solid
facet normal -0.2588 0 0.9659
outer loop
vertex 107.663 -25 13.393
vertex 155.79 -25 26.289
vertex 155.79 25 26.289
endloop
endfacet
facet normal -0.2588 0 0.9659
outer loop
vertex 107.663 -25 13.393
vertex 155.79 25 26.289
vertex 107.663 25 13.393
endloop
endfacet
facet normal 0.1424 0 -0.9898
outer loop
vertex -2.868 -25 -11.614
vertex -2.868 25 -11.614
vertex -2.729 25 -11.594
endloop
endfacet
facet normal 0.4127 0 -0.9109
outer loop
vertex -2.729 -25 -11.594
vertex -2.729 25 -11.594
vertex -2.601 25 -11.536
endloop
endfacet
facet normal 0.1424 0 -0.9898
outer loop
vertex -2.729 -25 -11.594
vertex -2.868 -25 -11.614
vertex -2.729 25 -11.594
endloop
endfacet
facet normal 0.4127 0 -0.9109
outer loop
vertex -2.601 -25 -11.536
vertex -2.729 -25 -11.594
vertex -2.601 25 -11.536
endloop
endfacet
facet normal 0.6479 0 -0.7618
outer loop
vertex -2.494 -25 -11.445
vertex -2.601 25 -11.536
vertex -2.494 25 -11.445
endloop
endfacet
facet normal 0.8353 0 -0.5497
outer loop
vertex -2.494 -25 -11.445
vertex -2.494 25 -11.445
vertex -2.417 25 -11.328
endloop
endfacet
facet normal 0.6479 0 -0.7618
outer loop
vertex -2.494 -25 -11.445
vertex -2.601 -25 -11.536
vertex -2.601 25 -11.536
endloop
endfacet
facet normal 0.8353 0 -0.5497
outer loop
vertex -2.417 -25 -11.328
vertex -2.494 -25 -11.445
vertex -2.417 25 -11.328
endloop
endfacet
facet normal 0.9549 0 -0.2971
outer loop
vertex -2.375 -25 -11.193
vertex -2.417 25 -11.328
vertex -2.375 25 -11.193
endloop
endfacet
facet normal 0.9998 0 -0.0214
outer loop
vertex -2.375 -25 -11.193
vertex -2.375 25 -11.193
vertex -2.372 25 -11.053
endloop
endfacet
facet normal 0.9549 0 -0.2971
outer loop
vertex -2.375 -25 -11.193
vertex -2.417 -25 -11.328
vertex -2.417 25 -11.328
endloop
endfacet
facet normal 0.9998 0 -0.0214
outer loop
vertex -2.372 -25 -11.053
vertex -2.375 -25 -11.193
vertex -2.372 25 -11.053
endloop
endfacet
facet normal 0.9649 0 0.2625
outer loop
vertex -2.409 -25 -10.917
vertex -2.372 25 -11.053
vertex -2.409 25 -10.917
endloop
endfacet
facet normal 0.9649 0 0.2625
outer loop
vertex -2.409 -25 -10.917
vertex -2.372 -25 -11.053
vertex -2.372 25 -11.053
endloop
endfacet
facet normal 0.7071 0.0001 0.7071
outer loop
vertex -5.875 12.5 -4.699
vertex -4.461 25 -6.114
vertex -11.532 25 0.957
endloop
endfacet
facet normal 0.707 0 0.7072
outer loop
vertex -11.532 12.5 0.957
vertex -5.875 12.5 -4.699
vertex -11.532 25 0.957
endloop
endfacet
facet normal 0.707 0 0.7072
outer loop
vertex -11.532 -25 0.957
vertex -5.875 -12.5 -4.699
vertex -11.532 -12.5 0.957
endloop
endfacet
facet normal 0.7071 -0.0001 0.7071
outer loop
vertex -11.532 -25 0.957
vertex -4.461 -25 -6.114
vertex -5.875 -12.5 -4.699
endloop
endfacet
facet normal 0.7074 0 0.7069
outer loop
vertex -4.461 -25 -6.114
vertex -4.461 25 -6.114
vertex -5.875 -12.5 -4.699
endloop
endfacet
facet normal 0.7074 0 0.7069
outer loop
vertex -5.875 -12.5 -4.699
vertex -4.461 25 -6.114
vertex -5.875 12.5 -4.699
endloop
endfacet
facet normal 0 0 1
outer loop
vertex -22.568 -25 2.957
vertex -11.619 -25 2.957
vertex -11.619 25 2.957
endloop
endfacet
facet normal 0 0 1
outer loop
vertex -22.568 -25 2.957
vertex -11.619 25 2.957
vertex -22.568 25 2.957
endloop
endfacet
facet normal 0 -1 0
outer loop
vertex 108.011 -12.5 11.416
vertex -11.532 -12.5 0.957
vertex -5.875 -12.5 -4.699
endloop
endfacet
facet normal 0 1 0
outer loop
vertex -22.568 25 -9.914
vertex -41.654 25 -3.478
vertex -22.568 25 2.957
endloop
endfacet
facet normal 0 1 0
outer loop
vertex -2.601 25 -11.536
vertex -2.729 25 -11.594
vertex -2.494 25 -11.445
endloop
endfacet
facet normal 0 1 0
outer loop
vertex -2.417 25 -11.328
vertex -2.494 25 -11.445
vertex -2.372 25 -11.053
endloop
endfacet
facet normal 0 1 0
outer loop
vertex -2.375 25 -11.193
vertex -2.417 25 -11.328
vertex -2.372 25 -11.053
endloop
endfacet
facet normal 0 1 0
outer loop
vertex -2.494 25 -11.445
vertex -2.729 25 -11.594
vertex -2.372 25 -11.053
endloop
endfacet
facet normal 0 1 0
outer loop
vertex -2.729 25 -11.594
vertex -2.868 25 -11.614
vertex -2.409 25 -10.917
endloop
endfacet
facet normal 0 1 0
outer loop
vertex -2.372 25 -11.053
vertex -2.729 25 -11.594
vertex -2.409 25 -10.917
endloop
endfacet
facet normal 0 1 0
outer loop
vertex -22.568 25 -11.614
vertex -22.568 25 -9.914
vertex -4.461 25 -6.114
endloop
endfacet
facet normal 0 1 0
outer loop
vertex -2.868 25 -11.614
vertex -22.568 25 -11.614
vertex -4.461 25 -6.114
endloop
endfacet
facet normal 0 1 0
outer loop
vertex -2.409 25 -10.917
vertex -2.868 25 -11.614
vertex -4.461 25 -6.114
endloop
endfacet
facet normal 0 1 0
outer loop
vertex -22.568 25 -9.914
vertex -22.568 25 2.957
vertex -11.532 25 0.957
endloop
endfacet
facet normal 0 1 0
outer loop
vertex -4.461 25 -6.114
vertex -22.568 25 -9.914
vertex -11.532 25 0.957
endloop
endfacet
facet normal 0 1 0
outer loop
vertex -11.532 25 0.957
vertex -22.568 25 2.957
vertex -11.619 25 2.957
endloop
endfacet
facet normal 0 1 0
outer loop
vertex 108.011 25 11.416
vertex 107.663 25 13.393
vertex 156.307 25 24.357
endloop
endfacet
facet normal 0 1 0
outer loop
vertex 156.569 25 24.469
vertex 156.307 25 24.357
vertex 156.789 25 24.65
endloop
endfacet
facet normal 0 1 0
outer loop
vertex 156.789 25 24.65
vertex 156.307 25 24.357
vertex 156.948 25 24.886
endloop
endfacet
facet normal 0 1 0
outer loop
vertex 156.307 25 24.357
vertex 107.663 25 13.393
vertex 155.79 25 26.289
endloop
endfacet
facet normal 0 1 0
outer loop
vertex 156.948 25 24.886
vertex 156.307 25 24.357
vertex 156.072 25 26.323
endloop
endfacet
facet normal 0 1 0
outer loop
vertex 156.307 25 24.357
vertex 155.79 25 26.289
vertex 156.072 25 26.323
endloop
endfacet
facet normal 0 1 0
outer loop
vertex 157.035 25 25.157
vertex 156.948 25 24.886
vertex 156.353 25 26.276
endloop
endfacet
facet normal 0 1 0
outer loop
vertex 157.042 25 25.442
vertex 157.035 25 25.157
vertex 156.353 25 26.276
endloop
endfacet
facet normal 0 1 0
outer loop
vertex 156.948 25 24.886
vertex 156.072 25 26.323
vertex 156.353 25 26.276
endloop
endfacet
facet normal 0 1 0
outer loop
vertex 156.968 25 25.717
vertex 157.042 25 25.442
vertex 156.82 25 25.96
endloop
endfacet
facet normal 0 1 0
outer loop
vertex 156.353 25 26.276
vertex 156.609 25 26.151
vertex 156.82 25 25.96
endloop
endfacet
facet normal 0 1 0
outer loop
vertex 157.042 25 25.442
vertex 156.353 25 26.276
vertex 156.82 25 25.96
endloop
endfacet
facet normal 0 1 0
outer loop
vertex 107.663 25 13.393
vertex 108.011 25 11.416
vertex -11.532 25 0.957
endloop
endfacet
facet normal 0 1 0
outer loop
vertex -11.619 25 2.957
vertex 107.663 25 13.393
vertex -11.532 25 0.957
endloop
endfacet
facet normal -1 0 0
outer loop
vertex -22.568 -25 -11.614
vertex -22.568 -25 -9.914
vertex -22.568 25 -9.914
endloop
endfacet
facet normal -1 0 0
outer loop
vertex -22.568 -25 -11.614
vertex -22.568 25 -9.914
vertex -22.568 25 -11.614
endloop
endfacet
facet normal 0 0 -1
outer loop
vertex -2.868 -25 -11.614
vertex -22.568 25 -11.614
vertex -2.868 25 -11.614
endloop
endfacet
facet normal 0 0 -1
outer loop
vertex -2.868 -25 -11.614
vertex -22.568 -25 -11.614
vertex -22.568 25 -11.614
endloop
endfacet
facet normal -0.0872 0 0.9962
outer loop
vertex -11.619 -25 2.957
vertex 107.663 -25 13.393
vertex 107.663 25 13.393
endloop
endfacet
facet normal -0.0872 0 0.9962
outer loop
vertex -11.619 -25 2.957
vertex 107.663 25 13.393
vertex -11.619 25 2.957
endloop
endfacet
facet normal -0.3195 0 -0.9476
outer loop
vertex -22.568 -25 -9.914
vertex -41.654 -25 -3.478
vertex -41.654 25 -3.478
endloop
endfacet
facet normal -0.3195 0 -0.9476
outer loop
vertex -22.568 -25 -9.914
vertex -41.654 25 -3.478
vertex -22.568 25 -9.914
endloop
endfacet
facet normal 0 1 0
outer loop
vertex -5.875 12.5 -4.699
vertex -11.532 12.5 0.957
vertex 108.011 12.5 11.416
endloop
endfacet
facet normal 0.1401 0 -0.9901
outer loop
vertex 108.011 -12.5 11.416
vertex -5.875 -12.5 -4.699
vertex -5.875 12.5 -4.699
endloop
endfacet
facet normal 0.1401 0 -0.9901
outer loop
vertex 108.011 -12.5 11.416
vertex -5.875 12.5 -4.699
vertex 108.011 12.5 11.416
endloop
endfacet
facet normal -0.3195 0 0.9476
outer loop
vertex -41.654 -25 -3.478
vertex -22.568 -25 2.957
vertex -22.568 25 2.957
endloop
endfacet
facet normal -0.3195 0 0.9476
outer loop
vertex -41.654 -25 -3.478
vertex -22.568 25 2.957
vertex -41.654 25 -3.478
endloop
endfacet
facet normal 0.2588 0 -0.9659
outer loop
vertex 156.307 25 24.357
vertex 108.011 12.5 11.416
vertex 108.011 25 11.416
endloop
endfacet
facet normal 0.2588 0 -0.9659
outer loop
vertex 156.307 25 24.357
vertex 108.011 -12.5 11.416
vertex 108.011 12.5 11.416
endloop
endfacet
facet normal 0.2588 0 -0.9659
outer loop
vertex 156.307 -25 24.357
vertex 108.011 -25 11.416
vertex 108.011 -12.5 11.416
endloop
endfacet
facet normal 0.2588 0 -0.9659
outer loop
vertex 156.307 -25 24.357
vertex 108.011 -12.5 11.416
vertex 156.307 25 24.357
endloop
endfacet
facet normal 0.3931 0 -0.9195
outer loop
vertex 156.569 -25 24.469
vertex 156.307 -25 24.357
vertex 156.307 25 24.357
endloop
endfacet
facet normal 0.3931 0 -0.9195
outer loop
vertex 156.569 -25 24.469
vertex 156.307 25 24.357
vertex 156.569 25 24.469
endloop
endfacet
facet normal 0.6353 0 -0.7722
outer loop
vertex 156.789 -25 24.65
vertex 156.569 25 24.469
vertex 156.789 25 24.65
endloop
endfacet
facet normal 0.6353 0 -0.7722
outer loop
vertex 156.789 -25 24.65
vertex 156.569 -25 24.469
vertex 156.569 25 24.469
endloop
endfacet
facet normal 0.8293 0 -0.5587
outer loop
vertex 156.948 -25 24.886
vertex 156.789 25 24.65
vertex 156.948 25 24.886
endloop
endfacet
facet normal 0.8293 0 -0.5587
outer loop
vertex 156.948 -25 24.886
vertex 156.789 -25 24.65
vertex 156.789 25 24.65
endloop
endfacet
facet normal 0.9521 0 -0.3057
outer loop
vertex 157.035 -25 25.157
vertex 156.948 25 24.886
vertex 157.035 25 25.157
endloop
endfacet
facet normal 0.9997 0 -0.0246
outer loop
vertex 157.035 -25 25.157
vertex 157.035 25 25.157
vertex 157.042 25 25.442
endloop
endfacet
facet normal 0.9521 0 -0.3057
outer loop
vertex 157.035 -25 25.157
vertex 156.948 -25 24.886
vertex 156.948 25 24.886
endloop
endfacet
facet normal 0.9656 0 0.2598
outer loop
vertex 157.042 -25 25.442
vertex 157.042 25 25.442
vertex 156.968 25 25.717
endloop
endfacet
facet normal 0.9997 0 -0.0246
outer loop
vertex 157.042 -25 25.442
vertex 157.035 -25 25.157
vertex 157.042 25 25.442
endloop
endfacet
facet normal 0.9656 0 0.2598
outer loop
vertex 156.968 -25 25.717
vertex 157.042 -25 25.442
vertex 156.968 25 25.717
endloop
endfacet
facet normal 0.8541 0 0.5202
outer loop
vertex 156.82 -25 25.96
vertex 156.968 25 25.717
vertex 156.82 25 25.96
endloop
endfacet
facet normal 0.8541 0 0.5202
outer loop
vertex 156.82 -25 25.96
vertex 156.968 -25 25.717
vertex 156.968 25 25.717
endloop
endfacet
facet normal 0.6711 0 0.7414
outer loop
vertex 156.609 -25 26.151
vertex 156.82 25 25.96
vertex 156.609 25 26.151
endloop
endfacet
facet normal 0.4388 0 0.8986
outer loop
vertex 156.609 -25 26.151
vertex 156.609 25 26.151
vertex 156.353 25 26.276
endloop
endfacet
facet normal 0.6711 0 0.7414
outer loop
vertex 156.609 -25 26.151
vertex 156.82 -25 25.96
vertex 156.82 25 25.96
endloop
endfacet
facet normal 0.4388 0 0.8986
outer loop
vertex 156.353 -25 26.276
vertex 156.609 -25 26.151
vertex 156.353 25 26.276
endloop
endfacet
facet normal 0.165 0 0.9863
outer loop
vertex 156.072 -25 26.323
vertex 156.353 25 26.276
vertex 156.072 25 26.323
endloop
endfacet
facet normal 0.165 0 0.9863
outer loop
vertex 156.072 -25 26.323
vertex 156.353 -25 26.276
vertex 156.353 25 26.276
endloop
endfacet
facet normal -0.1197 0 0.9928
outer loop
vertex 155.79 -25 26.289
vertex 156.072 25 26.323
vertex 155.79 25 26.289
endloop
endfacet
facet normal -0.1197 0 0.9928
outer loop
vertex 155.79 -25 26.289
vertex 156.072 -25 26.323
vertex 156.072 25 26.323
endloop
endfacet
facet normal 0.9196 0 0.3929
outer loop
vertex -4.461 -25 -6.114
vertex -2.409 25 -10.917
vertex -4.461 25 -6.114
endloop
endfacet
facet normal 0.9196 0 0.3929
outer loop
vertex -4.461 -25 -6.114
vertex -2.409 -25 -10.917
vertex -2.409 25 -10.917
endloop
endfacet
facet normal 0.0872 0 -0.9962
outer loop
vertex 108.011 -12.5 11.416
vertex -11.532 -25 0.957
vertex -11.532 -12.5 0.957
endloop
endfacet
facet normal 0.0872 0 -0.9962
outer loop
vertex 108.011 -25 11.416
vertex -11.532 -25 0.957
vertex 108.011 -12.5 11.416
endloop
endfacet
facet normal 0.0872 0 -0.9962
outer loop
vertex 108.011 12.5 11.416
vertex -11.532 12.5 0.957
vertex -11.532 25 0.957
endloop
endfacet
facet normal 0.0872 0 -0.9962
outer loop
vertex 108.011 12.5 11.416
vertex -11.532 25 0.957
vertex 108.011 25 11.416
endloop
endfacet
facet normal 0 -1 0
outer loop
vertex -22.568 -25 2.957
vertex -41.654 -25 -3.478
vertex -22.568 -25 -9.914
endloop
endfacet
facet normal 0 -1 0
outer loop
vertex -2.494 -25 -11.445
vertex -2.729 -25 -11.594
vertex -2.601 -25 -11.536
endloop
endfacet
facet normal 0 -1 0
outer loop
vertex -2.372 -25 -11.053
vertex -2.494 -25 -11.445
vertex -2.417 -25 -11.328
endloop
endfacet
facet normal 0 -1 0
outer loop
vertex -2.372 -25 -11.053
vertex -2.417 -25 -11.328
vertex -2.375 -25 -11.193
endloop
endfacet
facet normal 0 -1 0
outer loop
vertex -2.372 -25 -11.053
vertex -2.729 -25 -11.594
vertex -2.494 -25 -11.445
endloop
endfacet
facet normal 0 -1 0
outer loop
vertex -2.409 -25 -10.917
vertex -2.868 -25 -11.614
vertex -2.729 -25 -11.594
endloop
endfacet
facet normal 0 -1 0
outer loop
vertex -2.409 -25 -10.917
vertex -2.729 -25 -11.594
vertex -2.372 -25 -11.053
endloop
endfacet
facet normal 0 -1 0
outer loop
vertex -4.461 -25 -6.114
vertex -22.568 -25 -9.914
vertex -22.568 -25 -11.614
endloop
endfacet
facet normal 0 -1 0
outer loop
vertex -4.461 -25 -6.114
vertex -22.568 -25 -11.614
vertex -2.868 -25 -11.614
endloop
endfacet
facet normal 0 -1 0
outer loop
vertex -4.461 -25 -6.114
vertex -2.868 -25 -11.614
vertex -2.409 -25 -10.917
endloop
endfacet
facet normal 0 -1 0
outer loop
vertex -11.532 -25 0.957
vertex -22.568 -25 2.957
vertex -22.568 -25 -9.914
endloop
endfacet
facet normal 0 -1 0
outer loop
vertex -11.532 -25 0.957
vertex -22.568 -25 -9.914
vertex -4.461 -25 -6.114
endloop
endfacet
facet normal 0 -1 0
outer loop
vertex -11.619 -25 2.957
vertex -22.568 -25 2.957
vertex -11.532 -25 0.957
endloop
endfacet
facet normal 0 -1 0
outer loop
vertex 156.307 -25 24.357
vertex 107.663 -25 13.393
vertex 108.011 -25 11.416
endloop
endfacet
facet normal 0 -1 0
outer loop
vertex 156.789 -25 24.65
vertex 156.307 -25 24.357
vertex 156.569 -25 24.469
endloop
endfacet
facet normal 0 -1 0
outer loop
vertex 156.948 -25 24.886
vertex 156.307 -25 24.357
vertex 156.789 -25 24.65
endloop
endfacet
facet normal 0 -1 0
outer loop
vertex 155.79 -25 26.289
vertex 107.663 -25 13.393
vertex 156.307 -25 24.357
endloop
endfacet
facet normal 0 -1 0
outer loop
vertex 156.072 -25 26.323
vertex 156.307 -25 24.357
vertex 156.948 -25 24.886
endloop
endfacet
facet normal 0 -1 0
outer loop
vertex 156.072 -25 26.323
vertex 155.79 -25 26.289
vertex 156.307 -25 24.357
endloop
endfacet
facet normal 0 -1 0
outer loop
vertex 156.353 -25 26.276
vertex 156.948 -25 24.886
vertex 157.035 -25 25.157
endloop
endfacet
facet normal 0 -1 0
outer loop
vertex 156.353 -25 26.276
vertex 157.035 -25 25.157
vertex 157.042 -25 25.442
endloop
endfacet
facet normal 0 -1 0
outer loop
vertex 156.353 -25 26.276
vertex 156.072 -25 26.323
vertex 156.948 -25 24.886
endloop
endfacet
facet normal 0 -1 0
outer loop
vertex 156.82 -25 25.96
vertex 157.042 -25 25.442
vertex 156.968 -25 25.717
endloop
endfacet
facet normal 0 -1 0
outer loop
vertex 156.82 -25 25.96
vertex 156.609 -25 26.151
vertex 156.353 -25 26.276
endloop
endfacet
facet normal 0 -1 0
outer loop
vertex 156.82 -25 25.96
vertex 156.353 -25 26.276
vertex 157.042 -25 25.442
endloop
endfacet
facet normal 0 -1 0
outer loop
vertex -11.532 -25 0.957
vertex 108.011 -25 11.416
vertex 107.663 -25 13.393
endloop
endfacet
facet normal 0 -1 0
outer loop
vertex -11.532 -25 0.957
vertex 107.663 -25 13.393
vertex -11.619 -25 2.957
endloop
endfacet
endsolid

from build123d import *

# Parameters (mm, degrees)
F1_DEPTH = 25
F2_DEPTH = 12.5


with BuildPart() as f1:
    # F0 (on Front) → F1 (new body, symmetric)
    with BuildSketch(Plane.XZ):
        with BuildLine():
            Line((-2.408674, -10.917151), (-4.461097, -6.113606))
            Line((-4.461097, -6.113606), (-5.875311, -4.699392))
            Line((-5.875311, -4.699392), (-11.532165, 0.957462))
            Line((-11.532165, 0.957462), (108.011199, 11.416151))
            Line((108.011199, 11.416151), (156.30749, 24.357103))
            ThreePointArc((156.30749, 24.357103), (157.014597, 25.581849), (155.789852, 26.288956))
            Line((155.789852, 26.288956), (107.662575, 13.393291))
            Line((107.662575, 13.393291), (-11.619487, 2.957463))
            Line((-11.619487, 2.957463), (-22.568457, 2.957463))
            Line((-22.568457, 2.957463), (-41.653733, -3.478072))
            Line((-41.653733, -3.478072), (-22.568462, -9.913606))
            Line((-22.568462, -9.913606), (-22.568462, -11.613606))
            Line((-22.568462, -11.613606), (-2.868462, -11.613606))
            ThreePointArc((-2.868462, -11.613606), (-2.451193, -11.38908), (-2.408674, -10.917151))
        make_face()
    extrude(amount=F1_DEPTH, both=True)

    # F0 (on Front) → F2 (join, symmetric)
    with BuildSketch(Plane.XZ):
        Polygon((-11.532165, 0.957462), (-5.875311, -4.699392), (108.011199, 11.416151), align=None)
    extrude(amount=F2_DEPTH, both=True)


solid = f1.part
